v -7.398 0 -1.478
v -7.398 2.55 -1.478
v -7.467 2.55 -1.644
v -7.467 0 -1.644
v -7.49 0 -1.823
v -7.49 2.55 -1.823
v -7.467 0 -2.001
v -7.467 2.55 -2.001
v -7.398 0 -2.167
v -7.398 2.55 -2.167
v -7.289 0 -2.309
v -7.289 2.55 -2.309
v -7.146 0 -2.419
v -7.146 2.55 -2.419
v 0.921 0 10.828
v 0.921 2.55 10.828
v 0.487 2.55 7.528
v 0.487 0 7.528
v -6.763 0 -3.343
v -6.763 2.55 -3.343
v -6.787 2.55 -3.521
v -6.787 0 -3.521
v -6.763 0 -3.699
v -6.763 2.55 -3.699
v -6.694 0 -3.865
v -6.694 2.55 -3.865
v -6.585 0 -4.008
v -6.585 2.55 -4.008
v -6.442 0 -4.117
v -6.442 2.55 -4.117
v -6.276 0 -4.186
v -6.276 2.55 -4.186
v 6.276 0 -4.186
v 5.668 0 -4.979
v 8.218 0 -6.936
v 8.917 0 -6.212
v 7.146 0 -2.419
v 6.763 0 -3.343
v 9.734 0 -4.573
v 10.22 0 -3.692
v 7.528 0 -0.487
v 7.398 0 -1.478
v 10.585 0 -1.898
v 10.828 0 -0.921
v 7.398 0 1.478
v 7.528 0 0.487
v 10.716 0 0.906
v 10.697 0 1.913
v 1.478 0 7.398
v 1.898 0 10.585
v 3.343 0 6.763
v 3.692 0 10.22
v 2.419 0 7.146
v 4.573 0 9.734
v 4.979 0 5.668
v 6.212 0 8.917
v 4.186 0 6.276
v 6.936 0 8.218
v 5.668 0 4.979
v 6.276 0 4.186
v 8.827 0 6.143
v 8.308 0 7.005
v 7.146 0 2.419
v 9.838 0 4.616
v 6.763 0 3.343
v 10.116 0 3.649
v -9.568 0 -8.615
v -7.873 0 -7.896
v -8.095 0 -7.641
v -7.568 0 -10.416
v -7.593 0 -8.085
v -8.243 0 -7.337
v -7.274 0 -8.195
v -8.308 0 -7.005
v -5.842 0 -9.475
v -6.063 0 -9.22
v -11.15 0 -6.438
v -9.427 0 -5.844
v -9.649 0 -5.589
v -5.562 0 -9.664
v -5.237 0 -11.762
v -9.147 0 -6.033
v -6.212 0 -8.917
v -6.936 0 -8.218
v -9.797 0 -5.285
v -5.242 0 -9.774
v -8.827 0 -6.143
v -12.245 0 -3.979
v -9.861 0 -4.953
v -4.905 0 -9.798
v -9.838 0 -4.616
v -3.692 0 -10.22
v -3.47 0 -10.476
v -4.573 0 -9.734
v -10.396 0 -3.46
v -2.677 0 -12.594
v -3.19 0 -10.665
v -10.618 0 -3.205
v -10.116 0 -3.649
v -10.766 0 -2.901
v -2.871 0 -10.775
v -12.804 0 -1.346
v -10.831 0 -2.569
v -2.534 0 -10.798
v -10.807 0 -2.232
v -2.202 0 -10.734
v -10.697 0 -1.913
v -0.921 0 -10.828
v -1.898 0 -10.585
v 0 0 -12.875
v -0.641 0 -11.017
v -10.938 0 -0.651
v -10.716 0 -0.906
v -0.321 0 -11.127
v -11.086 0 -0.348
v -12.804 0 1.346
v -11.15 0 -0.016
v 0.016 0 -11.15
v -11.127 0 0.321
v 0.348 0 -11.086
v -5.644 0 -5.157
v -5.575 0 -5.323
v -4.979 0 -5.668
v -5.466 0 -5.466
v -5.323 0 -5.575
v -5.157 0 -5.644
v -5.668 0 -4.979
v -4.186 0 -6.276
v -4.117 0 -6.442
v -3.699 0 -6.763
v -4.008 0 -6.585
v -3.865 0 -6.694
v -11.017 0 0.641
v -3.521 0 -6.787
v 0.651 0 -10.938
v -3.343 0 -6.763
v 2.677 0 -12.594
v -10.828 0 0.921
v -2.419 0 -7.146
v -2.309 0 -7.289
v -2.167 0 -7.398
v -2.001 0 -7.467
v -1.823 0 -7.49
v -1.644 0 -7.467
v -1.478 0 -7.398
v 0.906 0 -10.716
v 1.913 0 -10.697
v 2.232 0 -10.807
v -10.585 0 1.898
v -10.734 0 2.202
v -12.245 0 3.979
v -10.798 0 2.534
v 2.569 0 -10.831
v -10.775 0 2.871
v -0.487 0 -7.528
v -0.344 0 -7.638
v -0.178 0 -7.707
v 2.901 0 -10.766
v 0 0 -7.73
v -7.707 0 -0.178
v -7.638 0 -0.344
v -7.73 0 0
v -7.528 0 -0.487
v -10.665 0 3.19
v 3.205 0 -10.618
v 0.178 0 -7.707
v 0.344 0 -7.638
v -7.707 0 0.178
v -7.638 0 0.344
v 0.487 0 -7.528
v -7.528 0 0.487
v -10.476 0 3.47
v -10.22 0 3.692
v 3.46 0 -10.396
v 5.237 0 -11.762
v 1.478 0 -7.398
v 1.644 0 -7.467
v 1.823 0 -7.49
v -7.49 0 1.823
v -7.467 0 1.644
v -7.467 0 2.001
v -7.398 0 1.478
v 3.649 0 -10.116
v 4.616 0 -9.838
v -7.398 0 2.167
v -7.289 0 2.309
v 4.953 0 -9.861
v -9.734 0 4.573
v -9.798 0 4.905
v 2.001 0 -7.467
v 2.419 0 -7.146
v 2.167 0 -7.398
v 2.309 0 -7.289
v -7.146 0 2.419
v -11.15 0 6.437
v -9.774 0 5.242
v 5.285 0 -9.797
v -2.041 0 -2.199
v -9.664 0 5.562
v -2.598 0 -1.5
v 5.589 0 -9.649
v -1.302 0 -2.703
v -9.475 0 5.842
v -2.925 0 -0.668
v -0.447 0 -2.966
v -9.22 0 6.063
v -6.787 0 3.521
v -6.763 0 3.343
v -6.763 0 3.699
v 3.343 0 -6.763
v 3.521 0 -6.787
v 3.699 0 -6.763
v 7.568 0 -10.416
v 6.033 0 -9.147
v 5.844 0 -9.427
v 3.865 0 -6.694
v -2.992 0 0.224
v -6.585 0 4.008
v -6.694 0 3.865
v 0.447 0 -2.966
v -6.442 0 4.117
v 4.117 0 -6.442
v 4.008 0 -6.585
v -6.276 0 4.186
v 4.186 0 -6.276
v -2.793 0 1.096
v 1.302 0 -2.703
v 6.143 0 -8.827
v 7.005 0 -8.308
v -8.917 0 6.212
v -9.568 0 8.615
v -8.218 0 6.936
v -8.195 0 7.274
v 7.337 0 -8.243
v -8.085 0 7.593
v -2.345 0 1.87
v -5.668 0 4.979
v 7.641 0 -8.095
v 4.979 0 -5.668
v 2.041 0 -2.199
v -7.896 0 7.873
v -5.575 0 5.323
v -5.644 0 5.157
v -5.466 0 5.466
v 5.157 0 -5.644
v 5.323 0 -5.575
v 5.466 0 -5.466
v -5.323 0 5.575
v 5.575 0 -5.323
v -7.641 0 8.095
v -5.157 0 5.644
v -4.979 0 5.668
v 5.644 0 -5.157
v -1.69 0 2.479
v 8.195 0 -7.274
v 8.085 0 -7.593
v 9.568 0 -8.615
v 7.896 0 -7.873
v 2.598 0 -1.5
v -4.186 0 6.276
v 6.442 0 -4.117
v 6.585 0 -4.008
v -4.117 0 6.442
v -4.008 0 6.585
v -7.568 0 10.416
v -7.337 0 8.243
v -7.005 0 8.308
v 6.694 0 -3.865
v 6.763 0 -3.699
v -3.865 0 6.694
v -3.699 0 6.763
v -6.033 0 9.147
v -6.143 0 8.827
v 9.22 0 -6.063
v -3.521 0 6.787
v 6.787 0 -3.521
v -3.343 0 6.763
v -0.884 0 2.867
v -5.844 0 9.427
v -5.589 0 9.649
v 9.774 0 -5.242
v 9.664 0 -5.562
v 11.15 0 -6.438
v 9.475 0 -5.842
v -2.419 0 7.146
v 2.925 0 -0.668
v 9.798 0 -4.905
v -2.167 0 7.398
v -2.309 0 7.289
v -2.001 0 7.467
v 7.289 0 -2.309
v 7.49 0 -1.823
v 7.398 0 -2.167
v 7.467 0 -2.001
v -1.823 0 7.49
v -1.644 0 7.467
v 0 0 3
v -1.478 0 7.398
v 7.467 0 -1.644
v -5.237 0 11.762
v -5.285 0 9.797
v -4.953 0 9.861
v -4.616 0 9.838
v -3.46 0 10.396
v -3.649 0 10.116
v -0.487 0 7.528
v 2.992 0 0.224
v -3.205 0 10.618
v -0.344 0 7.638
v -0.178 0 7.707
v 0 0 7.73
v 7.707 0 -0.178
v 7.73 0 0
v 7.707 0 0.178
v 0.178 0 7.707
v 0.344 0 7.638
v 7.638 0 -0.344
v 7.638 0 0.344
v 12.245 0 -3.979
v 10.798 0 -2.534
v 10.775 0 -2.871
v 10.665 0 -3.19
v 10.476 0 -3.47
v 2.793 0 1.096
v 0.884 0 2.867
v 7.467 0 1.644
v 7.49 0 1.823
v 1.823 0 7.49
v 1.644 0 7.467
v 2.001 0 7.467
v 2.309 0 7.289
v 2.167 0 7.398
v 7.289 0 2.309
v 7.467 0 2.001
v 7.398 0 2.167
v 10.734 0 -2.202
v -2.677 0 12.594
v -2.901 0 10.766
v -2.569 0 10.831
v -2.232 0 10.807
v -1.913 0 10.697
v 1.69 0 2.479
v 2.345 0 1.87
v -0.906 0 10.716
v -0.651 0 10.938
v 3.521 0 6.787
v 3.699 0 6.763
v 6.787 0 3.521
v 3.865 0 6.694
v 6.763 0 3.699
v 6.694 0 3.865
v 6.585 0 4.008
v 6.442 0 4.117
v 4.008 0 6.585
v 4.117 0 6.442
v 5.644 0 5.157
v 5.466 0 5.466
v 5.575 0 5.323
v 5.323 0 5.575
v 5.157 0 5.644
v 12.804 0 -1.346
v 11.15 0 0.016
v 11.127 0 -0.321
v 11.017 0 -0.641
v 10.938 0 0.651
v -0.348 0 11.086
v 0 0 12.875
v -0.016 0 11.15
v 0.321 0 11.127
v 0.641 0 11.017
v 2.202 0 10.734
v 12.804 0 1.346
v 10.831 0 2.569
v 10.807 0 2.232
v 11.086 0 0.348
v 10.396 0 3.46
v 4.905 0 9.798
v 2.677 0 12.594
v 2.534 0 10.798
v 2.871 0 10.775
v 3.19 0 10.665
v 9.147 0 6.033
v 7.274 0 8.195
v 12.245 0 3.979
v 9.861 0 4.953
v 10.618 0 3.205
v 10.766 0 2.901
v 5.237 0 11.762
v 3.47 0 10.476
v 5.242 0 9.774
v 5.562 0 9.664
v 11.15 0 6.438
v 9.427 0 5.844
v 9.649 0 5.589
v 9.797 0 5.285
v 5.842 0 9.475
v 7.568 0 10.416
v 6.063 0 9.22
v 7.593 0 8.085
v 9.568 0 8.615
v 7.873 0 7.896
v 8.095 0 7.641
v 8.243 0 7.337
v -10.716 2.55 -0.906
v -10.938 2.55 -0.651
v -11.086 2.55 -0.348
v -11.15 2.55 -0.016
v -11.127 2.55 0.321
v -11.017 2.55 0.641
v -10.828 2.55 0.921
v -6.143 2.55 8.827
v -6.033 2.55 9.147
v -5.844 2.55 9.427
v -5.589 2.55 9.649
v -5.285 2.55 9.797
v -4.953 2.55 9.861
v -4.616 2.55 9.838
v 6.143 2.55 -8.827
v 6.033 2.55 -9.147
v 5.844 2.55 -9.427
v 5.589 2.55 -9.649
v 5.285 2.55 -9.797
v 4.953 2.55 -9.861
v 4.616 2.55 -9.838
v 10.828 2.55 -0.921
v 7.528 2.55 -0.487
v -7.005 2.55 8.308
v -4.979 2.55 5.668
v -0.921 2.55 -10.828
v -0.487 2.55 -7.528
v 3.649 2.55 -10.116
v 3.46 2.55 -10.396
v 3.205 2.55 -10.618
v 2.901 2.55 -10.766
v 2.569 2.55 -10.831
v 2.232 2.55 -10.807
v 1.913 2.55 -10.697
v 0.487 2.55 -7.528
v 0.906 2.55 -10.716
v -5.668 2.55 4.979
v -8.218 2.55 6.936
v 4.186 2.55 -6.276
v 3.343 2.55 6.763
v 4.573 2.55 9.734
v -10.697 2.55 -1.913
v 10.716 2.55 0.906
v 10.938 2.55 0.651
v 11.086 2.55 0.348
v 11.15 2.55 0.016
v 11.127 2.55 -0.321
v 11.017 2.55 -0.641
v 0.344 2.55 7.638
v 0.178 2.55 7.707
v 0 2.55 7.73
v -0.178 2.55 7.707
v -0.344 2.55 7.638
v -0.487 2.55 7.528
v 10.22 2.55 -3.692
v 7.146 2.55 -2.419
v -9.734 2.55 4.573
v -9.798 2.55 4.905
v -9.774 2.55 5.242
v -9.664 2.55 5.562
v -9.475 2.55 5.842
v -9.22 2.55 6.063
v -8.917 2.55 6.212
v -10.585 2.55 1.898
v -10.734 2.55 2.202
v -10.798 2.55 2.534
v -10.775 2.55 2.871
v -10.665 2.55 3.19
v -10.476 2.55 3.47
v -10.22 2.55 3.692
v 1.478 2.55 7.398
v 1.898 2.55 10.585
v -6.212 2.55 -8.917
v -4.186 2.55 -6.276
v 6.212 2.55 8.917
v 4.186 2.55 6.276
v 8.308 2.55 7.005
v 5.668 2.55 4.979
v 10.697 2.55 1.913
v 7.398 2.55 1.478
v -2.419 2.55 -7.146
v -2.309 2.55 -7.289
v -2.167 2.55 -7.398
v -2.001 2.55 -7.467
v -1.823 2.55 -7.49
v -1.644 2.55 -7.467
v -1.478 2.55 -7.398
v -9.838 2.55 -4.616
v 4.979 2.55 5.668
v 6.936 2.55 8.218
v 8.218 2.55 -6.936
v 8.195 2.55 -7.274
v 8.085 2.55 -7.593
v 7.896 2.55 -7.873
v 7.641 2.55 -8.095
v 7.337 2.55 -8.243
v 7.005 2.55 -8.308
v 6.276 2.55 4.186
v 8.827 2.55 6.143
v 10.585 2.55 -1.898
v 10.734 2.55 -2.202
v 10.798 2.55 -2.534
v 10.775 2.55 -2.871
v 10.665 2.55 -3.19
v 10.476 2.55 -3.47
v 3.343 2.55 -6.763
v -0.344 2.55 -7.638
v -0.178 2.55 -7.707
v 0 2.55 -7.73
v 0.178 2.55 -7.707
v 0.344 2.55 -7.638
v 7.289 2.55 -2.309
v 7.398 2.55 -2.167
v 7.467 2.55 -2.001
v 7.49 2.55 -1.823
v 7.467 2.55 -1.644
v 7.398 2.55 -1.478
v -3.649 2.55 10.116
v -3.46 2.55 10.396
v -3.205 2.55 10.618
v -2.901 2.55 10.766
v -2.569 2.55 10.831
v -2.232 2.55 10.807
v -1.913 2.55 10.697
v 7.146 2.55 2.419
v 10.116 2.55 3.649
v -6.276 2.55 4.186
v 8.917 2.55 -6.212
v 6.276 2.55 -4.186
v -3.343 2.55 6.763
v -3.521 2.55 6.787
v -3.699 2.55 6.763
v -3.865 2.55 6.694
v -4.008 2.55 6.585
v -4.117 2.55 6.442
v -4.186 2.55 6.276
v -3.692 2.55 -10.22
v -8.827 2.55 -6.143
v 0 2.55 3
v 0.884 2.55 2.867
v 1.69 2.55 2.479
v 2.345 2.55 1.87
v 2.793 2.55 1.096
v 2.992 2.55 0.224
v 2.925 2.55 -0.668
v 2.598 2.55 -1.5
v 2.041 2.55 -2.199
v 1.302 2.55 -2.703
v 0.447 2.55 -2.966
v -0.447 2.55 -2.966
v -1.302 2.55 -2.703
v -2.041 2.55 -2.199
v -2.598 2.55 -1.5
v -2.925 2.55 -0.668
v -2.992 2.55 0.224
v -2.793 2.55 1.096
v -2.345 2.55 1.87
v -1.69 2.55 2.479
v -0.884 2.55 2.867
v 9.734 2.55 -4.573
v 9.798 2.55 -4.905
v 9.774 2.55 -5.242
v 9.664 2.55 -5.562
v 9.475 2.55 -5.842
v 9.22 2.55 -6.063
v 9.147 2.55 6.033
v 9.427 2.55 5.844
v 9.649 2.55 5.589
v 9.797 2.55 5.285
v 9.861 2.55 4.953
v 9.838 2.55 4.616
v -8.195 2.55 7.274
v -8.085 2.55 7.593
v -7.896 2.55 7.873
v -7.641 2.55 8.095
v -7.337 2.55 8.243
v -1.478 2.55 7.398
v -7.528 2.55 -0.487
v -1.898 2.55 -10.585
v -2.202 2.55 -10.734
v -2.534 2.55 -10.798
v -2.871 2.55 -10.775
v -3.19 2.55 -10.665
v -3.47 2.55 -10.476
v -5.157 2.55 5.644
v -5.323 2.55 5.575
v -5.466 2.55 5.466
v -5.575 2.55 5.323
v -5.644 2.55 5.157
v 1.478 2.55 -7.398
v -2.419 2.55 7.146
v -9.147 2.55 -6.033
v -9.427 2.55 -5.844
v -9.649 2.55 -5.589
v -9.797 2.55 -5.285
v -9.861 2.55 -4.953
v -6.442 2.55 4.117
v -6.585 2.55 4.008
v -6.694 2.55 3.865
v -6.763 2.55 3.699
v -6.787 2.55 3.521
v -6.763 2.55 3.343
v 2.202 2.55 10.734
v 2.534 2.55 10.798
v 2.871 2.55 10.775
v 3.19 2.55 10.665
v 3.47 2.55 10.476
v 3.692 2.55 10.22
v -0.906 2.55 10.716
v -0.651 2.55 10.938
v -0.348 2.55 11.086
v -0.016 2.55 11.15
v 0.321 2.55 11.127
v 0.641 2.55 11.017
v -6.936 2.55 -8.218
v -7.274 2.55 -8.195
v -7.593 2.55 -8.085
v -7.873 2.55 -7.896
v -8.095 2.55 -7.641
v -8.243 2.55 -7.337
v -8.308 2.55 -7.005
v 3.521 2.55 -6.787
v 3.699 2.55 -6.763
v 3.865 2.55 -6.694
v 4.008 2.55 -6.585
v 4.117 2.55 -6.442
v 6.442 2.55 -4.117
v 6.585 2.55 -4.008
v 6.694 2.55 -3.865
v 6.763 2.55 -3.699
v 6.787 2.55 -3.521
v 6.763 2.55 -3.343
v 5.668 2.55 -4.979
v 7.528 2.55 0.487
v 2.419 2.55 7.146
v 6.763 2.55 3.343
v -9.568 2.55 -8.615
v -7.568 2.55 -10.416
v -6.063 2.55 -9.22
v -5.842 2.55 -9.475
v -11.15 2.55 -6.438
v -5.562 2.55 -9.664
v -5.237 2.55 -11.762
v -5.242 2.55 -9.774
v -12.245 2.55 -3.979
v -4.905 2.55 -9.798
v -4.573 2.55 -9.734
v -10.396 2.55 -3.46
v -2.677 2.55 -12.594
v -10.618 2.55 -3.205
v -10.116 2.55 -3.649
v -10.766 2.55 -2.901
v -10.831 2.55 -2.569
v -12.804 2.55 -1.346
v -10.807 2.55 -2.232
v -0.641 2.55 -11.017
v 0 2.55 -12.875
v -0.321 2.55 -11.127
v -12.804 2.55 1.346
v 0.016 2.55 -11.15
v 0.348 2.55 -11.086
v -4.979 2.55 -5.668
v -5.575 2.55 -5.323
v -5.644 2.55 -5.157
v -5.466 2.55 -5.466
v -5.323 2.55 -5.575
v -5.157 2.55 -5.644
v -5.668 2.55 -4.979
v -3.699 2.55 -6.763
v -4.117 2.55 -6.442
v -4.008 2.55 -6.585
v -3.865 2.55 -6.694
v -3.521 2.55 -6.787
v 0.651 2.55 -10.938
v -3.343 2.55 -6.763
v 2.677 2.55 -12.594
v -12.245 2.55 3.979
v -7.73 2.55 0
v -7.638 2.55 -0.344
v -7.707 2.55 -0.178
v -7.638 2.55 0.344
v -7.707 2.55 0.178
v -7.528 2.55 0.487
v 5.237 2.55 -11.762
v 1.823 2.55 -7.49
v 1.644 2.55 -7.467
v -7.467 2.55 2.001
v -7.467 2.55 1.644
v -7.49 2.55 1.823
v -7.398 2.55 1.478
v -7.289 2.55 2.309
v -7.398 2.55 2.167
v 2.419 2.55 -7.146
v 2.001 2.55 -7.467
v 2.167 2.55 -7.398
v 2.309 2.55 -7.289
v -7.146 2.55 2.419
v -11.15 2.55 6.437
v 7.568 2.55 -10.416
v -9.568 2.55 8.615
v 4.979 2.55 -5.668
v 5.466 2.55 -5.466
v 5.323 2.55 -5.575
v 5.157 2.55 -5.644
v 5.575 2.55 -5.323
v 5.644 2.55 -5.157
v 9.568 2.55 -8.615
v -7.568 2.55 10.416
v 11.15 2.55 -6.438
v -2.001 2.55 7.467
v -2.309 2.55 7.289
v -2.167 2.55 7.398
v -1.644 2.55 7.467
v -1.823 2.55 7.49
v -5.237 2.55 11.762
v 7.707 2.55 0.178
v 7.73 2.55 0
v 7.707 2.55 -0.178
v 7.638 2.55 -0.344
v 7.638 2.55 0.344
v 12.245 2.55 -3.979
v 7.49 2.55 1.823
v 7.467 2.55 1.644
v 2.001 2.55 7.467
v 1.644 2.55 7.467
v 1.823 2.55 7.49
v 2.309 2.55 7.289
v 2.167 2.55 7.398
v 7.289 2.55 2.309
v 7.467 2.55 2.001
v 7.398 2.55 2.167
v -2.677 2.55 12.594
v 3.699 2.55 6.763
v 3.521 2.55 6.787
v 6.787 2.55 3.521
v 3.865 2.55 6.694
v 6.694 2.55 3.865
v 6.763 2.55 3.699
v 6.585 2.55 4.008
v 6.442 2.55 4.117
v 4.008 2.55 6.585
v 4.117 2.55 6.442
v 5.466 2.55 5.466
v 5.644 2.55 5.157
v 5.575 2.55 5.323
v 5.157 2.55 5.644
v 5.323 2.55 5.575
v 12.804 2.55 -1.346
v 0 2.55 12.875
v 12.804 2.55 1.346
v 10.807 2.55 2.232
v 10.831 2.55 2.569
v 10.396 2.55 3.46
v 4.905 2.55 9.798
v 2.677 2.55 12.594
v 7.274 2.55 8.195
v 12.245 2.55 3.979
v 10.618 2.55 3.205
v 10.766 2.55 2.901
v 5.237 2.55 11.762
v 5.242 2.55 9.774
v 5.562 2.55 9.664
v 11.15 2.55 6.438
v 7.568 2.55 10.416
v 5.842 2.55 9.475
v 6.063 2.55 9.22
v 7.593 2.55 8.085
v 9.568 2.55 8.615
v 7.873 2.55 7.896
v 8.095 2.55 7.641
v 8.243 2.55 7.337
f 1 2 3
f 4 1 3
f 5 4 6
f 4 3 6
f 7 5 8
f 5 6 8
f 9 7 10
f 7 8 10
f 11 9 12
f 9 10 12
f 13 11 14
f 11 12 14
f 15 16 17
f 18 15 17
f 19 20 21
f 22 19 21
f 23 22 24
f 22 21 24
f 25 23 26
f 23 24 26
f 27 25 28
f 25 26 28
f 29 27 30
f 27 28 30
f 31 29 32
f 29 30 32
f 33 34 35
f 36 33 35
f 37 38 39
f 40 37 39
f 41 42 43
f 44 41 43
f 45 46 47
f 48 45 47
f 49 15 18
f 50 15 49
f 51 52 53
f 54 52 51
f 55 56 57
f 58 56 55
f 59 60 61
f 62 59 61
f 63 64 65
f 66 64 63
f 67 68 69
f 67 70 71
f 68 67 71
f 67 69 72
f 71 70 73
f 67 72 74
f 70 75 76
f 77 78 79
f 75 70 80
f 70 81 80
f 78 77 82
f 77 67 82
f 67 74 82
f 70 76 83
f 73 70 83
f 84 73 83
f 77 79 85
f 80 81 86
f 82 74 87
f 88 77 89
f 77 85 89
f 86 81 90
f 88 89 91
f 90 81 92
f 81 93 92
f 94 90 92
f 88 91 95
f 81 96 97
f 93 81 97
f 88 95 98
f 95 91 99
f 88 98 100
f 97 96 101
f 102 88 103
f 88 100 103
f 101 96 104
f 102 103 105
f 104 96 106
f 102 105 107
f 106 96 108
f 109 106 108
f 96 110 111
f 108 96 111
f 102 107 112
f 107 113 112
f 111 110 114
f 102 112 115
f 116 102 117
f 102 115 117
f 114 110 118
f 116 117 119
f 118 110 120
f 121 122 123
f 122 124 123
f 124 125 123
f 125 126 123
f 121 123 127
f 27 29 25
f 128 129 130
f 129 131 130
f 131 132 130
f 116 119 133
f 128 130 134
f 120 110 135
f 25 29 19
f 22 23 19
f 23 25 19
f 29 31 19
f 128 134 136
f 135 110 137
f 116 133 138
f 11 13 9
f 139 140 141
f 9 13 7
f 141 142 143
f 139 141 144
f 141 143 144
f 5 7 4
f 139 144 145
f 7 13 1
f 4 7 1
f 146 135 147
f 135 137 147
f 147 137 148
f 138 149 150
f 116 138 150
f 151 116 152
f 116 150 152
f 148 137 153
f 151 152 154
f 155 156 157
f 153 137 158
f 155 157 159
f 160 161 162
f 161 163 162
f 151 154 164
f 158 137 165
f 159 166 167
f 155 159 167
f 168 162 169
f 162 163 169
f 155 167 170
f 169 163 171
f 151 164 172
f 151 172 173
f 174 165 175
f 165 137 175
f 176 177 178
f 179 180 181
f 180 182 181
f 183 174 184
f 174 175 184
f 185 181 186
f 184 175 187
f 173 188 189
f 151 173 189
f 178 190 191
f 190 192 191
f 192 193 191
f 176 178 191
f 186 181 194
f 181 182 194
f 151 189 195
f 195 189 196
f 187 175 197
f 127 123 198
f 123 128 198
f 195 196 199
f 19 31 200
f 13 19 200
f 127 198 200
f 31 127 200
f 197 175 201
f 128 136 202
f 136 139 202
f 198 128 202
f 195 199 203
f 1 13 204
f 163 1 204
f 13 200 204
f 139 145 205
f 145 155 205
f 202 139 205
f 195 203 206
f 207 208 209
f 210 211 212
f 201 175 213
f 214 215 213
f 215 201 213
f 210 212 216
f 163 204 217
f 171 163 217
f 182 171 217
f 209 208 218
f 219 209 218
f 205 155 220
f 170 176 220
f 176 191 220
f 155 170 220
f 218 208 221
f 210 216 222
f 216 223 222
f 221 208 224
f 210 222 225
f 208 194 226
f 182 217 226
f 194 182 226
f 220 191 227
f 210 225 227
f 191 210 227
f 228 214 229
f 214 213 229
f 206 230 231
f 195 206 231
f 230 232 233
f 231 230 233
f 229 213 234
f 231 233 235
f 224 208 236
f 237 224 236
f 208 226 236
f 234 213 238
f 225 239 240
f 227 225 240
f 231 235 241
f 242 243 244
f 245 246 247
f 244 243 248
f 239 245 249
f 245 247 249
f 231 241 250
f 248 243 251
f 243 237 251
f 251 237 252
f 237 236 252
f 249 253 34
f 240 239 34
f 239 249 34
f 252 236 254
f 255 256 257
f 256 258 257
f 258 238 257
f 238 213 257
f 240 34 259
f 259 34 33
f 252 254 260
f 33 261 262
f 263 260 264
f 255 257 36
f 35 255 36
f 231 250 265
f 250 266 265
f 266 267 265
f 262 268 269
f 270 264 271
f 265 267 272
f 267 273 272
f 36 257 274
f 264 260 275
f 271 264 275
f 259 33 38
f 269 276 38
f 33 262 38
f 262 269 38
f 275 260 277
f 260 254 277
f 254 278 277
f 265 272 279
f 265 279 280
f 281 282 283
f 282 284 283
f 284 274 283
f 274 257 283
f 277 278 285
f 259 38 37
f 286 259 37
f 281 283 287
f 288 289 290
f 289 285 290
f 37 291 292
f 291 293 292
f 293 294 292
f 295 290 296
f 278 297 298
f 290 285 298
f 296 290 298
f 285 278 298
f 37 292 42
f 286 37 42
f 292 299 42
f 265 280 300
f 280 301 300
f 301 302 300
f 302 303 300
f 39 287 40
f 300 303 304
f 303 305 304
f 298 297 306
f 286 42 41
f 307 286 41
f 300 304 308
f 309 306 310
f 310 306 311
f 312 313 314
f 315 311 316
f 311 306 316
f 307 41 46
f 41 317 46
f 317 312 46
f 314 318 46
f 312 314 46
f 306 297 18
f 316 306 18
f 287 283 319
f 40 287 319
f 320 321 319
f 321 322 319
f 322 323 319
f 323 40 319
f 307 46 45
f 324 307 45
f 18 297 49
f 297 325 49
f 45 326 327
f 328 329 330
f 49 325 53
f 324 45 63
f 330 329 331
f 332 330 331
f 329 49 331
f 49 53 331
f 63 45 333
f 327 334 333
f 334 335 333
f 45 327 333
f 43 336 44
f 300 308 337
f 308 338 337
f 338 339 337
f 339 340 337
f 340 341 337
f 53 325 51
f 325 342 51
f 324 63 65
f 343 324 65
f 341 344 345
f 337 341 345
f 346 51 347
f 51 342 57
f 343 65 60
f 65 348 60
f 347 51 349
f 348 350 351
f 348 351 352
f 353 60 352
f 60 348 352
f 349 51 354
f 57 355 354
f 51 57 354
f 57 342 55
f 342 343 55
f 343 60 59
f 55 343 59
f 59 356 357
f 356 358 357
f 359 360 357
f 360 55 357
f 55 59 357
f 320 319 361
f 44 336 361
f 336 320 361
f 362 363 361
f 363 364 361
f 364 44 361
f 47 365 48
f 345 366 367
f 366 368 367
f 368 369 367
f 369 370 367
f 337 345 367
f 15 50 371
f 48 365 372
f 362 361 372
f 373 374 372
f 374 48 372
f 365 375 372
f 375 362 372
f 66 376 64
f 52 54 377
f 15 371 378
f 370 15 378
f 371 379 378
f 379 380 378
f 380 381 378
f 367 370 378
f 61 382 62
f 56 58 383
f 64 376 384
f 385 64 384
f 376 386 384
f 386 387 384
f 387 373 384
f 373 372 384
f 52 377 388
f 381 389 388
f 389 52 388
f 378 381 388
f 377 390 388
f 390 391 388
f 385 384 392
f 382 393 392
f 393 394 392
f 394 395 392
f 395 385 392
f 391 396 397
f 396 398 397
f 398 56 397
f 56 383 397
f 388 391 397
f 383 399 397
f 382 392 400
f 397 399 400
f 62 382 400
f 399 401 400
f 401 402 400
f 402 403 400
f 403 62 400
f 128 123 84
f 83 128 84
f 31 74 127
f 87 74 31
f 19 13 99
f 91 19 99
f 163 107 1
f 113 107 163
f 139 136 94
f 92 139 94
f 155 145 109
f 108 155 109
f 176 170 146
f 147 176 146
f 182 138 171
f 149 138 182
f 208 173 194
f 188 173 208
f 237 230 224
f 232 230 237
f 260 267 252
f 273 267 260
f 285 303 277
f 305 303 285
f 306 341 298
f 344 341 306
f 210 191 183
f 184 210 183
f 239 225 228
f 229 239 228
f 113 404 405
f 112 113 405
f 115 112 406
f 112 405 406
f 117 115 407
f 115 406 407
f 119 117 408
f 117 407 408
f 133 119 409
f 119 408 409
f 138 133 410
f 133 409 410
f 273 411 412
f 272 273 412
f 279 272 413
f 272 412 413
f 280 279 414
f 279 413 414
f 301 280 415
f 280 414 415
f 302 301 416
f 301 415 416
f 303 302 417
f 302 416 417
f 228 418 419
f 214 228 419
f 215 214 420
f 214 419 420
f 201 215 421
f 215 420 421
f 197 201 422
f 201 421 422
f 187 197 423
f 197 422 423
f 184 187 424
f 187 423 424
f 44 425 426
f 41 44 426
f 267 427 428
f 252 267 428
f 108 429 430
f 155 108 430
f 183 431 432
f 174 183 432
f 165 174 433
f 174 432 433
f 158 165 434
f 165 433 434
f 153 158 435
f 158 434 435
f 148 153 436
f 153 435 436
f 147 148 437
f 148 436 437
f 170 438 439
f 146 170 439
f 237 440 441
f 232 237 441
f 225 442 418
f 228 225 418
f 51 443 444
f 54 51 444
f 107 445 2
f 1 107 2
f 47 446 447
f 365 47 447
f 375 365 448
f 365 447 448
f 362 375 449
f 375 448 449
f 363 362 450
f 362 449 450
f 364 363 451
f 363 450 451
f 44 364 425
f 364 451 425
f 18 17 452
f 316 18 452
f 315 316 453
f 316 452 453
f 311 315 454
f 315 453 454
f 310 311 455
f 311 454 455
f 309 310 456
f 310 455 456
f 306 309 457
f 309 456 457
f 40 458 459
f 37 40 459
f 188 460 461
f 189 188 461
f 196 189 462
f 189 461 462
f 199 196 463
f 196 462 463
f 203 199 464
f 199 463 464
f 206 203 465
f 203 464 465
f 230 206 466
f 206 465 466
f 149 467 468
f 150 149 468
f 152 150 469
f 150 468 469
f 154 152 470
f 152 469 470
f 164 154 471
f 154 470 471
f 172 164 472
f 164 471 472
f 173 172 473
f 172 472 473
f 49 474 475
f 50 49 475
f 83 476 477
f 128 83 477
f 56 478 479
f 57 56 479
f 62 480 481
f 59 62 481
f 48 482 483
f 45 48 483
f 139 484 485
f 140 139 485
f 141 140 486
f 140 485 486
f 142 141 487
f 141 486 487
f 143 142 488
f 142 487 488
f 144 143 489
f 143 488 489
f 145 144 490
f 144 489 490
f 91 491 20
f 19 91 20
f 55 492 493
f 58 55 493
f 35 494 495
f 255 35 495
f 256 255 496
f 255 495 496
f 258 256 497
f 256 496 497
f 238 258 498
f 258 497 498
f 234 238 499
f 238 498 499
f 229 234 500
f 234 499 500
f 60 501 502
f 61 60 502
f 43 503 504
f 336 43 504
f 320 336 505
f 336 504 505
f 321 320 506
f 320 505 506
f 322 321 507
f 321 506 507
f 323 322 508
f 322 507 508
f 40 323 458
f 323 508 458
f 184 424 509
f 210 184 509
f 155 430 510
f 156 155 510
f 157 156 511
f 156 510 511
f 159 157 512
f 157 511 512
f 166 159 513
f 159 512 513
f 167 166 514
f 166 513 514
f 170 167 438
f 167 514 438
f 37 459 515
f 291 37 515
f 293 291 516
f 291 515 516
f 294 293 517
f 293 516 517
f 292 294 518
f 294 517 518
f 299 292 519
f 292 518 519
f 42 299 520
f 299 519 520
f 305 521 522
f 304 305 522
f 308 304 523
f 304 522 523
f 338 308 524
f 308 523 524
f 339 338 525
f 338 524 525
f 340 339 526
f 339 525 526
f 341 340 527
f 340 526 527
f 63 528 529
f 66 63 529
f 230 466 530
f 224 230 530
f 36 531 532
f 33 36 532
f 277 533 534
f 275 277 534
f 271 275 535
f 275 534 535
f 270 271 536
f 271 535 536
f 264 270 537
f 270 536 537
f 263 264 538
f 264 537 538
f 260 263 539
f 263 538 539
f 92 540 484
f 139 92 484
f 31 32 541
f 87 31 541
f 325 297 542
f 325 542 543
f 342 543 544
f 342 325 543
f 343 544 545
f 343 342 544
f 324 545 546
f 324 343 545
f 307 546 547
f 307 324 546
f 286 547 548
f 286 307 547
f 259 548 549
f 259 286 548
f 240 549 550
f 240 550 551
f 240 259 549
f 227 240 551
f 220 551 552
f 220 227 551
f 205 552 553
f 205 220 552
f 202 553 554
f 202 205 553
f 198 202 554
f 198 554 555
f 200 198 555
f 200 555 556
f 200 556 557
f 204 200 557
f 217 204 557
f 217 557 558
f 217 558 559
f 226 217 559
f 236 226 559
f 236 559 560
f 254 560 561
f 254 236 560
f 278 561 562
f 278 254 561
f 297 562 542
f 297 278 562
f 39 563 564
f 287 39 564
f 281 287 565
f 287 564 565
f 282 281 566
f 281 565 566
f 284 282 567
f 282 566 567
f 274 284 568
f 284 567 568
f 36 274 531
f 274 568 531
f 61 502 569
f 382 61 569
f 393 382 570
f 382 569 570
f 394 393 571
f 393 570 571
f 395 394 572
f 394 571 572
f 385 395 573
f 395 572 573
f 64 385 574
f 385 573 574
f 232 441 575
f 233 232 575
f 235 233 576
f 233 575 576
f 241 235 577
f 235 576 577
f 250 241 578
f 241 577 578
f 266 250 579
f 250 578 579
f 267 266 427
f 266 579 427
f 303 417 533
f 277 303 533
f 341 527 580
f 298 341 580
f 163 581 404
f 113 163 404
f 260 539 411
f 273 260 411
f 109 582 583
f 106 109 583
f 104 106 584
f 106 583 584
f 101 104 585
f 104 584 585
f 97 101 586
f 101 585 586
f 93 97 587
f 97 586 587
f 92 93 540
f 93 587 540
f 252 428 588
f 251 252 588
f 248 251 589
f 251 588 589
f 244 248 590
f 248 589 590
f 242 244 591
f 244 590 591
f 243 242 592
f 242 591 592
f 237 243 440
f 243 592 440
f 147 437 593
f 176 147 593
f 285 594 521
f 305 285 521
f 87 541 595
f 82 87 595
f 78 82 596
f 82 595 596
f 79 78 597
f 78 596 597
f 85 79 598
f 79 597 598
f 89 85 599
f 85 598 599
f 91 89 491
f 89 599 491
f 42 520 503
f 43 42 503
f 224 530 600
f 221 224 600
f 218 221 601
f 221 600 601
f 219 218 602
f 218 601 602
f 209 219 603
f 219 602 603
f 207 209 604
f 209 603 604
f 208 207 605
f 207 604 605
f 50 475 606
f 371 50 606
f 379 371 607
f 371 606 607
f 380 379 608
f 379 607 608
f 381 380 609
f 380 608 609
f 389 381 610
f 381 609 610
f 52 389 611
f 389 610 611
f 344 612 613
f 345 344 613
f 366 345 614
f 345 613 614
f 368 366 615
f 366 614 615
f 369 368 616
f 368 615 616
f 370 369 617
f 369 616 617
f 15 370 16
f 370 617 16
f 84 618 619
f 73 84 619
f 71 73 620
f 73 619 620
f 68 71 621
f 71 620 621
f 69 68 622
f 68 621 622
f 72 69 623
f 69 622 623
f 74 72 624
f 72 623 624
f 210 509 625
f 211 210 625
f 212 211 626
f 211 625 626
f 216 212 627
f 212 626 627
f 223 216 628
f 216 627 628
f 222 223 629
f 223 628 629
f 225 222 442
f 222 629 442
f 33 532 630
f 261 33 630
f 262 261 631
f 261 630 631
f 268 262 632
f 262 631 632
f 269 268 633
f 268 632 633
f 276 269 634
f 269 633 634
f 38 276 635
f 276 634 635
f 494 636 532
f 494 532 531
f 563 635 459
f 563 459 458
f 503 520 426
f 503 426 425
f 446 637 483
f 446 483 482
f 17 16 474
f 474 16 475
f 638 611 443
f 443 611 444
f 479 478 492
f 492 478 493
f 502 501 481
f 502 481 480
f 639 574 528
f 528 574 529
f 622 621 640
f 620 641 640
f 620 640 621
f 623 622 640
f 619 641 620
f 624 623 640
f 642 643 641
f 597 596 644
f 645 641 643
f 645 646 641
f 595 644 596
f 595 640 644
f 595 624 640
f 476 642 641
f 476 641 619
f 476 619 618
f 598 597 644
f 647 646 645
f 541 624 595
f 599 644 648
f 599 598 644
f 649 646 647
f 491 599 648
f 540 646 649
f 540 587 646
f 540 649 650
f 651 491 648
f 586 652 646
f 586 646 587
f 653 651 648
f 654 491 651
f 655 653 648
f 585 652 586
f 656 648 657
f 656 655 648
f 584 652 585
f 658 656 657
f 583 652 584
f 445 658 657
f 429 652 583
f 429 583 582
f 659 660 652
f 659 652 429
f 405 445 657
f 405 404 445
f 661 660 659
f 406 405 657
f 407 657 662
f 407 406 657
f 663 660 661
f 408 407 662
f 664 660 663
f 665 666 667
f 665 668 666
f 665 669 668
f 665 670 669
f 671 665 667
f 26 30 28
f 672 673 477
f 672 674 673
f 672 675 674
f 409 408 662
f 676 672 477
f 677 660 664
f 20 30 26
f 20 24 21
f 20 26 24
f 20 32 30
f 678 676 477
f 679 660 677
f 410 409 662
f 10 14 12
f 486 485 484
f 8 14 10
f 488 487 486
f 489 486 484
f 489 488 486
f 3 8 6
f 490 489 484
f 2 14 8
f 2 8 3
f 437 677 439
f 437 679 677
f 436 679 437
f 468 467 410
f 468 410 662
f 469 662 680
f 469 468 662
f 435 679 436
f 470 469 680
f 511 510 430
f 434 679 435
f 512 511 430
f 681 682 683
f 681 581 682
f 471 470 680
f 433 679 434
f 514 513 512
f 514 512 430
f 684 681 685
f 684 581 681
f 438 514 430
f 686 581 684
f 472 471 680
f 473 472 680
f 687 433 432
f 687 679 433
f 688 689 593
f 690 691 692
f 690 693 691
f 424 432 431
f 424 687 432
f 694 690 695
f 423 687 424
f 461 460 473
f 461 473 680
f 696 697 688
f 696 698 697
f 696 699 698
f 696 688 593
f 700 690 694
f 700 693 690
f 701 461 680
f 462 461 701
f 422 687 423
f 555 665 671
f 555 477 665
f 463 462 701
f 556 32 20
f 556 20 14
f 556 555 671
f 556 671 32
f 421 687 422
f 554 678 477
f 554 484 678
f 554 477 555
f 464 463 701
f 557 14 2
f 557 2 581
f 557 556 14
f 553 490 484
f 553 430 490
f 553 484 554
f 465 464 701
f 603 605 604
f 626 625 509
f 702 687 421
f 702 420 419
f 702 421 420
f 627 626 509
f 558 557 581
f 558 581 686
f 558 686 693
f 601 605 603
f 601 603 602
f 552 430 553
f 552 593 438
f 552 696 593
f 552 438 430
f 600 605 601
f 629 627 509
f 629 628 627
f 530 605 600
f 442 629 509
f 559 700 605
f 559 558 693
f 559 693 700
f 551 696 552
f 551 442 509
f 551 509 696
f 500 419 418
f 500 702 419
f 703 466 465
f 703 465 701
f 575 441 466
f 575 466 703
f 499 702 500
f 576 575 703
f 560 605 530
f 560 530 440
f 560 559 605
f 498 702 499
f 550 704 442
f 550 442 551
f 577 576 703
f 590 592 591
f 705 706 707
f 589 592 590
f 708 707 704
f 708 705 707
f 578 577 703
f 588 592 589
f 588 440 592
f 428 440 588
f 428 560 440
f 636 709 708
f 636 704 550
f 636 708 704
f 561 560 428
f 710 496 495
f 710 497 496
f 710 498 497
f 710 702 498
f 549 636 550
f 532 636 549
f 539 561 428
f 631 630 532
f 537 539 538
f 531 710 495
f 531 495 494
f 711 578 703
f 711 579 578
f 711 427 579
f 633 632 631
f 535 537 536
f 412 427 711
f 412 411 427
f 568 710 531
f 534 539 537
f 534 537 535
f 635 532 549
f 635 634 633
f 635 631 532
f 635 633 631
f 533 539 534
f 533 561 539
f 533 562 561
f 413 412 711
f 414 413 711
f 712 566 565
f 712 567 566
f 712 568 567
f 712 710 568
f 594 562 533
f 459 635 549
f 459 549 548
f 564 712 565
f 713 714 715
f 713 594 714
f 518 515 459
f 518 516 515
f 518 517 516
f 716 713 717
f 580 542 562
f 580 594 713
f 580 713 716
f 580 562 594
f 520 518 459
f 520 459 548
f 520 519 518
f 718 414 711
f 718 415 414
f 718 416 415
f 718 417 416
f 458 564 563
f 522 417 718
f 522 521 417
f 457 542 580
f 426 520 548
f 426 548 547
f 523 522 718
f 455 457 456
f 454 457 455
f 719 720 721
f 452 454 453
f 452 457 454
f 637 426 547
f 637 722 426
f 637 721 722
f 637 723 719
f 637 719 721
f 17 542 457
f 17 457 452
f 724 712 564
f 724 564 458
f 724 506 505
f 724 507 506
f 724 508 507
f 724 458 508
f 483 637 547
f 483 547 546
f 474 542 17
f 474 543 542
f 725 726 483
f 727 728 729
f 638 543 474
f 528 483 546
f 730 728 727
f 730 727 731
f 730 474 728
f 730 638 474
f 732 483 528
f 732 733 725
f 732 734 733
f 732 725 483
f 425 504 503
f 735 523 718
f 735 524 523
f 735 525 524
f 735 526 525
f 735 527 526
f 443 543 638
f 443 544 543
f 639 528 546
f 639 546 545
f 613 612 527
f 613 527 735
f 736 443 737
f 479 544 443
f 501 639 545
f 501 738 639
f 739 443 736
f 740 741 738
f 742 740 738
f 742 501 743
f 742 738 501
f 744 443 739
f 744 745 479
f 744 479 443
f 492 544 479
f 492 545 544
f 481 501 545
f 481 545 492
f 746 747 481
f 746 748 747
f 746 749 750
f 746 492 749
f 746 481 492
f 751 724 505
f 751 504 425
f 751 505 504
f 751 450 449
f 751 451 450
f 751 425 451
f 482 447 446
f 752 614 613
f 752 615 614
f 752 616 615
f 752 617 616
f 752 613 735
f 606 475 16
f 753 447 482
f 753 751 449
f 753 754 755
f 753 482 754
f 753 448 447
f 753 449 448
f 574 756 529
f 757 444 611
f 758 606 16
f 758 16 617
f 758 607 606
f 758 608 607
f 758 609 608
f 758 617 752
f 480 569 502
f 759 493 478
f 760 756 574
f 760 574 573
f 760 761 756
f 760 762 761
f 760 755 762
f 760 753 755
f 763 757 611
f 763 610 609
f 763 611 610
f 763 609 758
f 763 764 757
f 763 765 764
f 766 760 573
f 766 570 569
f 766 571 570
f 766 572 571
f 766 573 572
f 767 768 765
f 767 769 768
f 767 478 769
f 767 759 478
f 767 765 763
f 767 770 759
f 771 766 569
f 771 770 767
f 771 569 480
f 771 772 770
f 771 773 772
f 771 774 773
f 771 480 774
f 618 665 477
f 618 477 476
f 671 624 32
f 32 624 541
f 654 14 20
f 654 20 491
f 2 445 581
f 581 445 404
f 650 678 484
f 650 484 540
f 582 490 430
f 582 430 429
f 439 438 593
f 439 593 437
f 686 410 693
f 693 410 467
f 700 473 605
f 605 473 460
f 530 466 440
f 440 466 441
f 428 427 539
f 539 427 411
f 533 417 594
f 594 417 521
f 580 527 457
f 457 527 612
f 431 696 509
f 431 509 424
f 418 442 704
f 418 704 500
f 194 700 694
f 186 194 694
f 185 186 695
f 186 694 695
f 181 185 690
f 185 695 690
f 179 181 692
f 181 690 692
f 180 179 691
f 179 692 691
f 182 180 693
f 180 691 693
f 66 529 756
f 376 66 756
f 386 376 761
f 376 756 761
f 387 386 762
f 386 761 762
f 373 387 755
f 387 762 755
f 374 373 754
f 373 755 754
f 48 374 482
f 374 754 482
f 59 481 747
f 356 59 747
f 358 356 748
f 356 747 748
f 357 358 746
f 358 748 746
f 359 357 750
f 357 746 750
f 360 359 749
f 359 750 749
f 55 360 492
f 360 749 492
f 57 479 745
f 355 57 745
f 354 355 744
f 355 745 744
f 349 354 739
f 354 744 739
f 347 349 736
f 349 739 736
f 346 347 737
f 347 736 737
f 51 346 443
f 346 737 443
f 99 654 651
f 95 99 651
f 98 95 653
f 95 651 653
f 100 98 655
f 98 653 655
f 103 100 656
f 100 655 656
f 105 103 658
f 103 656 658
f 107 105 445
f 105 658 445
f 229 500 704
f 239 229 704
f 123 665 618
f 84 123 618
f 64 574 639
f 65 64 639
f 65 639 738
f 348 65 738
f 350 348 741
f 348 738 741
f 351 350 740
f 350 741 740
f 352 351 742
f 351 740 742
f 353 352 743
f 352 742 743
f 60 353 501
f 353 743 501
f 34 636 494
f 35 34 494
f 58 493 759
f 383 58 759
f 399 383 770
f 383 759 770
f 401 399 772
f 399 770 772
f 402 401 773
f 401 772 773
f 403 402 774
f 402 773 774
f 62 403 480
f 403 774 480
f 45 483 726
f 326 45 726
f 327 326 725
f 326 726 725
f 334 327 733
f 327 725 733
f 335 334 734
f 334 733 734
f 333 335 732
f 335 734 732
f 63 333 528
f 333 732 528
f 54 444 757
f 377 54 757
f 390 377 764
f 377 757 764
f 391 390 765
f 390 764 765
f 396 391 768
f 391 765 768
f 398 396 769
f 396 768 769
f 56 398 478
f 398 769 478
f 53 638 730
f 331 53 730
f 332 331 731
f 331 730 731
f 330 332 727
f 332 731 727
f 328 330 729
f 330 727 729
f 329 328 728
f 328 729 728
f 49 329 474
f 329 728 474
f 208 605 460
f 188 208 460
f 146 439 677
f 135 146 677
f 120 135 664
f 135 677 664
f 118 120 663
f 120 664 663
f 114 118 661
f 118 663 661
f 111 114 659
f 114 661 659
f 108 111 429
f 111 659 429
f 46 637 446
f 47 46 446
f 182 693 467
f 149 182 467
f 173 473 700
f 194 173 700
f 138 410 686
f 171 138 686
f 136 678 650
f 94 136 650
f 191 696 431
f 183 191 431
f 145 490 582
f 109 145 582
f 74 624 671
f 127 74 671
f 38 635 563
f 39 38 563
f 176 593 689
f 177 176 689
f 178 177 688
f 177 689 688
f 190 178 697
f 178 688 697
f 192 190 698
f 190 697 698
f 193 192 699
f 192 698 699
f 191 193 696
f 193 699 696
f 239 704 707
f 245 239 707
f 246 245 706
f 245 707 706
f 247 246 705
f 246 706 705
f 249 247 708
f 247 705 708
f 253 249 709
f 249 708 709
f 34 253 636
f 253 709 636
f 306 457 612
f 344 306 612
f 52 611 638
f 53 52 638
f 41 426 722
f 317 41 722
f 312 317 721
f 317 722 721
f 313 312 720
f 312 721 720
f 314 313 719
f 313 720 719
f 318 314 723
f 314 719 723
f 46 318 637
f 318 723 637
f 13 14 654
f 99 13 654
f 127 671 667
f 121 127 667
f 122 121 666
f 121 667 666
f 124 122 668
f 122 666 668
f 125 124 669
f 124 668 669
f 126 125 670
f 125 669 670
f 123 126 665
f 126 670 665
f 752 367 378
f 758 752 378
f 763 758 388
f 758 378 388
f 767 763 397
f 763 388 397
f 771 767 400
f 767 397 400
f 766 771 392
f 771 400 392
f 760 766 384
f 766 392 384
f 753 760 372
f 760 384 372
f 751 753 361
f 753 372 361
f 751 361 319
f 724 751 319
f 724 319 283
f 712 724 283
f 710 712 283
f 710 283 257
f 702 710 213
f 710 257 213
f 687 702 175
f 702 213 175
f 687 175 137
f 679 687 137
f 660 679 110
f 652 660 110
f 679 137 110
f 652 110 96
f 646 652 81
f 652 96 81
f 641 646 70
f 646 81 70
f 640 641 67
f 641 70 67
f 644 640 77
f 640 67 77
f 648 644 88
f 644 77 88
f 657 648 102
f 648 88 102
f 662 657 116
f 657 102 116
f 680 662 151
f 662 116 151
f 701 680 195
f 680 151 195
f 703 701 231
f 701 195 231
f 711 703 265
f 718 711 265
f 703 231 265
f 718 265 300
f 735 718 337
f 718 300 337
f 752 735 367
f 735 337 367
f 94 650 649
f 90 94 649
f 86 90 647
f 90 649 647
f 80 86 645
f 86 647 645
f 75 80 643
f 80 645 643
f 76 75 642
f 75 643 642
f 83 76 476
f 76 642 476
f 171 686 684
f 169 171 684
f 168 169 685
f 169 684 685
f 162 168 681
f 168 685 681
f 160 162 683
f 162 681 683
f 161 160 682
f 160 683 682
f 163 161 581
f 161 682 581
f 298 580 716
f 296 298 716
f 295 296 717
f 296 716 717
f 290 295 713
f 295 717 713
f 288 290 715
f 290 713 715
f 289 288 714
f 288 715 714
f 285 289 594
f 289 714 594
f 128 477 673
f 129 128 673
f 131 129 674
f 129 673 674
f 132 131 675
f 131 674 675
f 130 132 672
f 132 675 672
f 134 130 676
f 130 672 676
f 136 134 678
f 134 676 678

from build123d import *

# Parameters (mm, degrees)
SKETCH2_R           = 12.875
SKETCH2_R_2         = 3
BOSS_EXTRUDE1_DEPTH = 2.55
CUT_EXTRUDE1_DEPTH  = 2.55
CIRPATTERN1_COUNT   = 24


with BuildPart() as part:
    # Sketch2 → Boss-Extrude1 (new body)
    with BuildSketch(Plane(origin=(0, 0, 0), x_dir=(1, 0, 0), z_dir=(0, 1, 0))):
        with Locations(Location((0, 0, 0), (0, 0, 270))):
            Circle(SKETCH2_R)
        with Locations(Location((0, 0, 0), (0, 0, 270))):
            Circle(SKETCH2_R_2, mode=Mode.SUBTRACT)
    extrude(amount=BOSS_EXTRUDE1_DEPTH)

    # Sketch4 → Cut-Extrude1 (cut)
    with BuildSketch(Plane(origin=(0, 2.55, 0), x_dir=(1, 0, 0), z_dir=(0, 1, 0))):
        with BuildLine():
            Line((0.486824592, 7.528448687), (0.906471755, 10.715985352))
            ThreePointArc((0.906471755, 10.715985352), (0.015796353, 11.15041104), (-0.921191613, 10.827793773))
            Line((-0.921191613, 10.827793773), (-0.486824592, 7.528448687))
            ThreePointArc((-0.486824592, 7.528448687), (0, 7.730098035), (0.486824592, 7.528448687))
        make_face()
    cut_extrude1 = extrude(amount=-CUT_EXTRUDE1_DEPTH, mode=Mode.SUBTRACT)

    # CirPattern1: Cut-Extrude1 ×24 about axis
    cirpattern1_axis = Axis((0, 0, 0), (0, 1, 0))
    for i in range(1, CIRPATTERN1_COUNT):
        add(cut_extrude1.rotate(cirpattern1_axis, i * 360 / CIRPATTERN1_COUNT), mode=Mode.SUBTRACT)


solid = part.part
